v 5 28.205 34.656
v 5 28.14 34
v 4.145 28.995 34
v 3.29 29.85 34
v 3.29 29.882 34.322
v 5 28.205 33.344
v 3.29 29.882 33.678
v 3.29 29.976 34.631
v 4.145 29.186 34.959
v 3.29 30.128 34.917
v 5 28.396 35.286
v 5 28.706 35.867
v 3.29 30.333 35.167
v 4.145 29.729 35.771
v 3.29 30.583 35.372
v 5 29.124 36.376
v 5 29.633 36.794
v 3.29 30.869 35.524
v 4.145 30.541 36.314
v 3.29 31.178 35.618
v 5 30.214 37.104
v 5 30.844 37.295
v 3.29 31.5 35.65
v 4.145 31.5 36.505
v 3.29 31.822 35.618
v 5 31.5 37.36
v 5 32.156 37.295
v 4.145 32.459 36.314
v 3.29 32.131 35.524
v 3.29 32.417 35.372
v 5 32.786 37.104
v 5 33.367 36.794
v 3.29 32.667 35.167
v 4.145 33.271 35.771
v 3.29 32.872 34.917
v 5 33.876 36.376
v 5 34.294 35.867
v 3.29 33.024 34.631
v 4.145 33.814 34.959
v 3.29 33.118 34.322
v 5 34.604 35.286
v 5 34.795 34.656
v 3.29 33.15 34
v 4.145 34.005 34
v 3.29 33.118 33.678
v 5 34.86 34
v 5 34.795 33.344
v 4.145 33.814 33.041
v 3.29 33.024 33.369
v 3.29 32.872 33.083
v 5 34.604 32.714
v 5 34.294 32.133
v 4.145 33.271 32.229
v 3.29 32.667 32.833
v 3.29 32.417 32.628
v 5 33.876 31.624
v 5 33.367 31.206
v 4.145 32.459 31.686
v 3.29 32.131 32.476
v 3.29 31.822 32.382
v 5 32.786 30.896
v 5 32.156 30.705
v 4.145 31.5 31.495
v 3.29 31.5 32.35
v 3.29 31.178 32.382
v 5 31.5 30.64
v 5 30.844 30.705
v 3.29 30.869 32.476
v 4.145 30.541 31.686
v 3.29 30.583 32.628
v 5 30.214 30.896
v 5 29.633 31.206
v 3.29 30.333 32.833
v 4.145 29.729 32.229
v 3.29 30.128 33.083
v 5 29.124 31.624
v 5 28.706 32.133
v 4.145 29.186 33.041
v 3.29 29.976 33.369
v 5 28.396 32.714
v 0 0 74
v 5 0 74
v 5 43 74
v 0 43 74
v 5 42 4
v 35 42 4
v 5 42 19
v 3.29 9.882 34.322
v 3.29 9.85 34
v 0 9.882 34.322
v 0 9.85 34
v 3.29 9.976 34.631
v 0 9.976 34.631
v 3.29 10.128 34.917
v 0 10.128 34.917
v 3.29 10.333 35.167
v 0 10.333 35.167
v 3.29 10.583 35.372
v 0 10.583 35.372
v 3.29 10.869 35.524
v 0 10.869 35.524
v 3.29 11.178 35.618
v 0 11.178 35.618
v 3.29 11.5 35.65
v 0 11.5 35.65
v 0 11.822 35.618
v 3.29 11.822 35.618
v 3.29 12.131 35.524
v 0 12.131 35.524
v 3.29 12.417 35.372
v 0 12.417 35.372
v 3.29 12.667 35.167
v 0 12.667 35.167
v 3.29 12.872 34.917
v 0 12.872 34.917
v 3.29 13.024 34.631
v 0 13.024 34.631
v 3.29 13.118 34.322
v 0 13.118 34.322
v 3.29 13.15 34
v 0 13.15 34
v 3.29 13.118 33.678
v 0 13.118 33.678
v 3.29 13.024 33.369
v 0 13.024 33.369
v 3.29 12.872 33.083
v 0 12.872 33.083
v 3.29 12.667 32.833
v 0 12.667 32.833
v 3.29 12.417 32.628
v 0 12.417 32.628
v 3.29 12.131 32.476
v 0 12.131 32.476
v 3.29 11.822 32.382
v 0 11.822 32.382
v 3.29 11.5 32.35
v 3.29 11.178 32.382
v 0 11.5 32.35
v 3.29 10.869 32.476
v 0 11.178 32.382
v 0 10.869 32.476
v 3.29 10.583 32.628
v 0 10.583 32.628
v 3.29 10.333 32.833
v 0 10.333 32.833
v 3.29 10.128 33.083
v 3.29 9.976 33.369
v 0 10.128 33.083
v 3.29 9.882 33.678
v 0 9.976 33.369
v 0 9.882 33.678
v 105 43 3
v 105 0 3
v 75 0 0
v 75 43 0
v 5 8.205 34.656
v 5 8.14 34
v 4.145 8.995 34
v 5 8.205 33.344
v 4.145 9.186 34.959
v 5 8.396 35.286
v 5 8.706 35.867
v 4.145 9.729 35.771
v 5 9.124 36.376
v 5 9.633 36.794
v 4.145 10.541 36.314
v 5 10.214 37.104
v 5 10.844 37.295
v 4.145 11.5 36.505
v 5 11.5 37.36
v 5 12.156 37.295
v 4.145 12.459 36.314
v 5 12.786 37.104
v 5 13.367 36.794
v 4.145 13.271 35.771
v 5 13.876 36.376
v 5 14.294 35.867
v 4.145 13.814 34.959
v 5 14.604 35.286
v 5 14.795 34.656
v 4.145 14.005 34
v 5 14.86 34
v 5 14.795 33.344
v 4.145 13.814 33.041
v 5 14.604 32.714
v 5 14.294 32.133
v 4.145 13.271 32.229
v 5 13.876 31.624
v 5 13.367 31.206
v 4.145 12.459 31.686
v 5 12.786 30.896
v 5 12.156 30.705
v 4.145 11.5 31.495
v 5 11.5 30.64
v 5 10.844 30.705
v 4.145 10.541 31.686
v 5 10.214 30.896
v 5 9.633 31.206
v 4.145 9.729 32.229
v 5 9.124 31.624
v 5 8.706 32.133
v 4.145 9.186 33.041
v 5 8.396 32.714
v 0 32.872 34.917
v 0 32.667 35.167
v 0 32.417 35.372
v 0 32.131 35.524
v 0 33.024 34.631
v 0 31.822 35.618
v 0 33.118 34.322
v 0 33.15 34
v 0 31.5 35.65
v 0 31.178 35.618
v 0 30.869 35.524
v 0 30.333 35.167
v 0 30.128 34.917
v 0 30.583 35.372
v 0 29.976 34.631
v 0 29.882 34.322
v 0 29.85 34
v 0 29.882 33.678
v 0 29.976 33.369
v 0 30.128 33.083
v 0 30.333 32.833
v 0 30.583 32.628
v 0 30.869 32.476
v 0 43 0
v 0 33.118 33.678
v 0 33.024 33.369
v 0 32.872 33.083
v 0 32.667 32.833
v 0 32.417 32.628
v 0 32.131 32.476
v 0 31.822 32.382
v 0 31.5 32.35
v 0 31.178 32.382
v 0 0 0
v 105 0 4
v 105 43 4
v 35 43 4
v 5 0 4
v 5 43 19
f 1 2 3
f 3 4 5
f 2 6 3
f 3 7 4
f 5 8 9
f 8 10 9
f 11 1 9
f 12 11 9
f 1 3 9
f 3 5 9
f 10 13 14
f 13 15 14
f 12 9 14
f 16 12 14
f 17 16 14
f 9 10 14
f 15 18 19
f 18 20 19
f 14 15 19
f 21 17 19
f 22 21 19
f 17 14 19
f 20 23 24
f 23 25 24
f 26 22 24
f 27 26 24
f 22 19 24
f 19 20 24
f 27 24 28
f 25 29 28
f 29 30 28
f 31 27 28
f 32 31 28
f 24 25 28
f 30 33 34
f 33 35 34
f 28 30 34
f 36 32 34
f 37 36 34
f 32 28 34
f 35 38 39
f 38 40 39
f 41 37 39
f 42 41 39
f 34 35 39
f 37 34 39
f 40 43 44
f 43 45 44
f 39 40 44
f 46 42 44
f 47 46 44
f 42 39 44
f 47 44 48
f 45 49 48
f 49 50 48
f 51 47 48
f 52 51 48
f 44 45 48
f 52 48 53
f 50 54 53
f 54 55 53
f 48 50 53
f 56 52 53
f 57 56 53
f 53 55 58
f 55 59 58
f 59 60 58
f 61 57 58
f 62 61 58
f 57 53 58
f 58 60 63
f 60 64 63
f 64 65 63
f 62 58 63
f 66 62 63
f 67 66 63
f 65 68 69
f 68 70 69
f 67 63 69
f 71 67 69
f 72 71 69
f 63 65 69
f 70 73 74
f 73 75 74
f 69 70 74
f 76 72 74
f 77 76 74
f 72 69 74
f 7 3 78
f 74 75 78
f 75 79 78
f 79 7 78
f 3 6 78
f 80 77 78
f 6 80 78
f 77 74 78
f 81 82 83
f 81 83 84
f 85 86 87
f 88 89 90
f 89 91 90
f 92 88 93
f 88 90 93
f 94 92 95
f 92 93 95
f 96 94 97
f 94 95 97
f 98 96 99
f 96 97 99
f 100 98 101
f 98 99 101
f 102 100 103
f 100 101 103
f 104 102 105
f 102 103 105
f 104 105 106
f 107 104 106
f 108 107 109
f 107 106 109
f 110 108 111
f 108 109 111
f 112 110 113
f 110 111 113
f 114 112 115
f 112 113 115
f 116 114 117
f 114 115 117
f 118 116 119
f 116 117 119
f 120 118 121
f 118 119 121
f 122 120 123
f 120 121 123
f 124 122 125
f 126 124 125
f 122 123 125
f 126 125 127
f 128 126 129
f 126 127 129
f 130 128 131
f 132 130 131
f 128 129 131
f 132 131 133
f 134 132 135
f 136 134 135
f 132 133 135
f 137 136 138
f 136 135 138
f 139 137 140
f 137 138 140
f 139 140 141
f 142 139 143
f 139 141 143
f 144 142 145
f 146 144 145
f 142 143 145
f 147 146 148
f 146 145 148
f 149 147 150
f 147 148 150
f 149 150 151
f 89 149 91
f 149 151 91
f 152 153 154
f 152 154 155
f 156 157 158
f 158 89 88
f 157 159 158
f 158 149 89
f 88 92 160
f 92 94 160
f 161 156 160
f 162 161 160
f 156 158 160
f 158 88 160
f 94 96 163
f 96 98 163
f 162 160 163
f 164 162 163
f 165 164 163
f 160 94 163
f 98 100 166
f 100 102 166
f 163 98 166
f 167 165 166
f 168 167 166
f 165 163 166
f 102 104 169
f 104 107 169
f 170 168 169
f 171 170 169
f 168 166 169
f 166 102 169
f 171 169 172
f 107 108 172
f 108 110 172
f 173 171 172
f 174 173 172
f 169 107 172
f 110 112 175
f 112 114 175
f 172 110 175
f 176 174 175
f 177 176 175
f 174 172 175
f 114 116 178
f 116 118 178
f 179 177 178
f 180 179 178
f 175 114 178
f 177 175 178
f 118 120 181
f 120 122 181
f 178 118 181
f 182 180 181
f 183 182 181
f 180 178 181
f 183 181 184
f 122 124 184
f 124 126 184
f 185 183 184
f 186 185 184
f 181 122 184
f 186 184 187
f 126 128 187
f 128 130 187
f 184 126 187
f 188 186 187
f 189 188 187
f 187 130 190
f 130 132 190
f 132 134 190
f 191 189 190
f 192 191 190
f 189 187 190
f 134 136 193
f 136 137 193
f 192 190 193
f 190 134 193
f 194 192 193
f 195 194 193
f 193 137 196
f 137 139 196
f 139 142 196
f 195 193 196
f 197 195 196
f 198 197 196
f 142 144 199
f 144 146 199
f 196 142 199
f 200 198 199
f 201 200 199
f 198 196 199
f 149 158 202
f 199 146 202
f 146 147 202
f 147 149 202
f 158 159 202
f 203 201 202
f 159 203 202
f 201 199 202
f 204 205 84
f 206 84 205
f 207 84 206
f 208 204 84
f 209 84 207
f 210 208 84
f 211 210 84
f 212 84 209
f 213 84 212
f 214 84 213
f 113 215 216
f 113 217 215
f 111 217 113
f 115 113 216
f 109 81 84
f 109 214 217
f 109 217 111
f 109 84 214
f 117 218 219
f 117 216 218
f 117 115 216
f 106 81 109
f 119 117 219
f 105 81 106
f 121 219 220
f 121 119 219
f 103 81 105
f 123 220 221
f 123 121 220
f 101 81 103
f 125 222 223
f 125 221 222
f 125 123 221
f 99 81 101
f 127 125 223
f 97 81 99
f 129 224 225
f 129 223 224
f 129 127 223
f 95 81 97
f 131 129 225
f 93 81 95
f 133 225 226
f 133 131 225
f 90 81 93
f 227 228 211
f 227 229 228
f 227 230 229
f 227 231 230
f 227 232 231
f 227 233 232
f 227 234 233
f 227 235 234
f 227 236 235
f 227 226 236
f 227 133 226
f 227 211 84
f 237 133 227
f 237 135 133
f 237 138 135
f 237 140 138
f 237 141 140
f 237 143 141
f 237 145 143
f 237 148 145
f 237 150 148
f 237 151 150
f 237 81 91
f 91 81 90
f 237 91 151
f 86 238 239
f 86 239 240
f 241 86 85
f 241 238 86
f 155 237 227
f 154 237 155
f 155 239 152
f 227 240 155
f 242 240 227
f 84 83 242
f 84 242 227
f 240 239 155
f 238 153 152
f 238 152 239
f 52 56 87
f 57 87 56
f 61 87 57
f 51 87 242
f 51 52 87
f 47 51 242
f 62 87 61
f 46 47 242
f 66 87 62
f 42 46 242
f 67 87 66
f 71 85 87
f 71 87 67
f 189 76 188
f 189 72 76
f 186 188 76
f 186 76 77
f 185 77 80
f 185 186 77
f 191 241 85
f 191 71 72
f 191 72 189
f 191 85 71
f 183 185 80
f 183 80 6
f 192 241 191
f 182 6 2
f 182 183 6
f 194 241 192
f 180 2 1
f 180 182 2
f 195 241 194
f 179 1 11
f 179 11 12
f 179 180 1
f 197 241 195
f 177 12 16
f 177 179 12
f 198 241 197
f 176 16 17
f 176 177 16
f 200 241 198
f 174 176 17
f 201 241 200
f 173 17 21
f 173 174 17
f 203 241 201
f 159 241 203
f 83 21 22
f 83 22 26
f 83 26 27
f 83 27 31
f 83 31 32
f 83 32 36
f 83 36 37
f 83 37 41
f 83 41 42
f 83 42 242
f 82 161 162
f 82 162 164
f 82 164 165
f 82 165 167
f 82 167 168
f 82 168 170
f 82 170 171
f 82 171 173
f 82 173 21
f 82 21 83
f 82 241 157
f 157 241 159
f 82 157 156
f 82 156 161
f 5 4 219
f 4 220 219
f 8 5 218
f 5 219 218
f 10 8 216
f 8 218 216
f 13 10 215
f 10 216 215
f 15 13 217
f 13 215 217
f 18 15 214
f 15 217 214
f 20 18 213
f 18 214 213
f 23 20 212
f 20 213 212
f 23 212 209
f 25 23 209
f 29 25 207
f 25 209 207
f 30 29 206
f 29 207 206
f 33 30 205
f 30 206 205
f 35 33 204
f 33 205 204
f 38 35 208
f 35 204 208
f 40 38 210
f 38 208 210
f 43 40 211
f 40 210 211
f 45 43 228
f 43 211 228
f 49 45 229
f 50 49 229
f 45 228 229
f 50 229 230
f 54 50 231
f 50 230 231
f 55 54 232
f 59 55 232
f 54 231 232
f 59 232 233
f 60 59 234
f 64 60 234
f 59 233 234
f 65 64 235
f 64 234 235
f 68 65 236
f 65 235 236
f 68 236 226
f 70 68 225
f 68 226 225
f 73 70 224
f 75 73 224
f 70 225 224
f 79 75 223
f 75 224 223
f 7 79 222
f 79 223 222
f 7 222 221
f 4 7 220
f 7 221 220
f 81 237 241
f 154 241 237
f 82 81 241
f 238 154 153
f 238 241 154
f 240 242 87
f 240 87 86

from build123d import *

# Parameters (mm, degrees)
F1_DEPTH       = 43
F3_D           = 3.3
F3_CSINK_D     = 6.72
F3_CSINK_ANGLE = 90
F4_SIZE2       = 3
F4_SIZE        = 30
F6_DEPTH       = 1


with BuildPart() as f1:
    # F0 (on Front) → F1 (new body)
    with BuildSketch(Plane.XZ):
        Polygon((0, 74), (0, 0), (105, 0), (105, 4), (5, 4), (5, 74), align=None)
    extrude(amount=-F1_DEPTH)

    # F3 (through all)
    with Locations(Plane.YZ.offset(5)):
        with Locations((31.5, 34), (11.5, 34)):
            CounterSinkHole(F3_D / 2, F3_CSINK_D / 2, counter_sink_angle=F3_CSINK_ANGLE)

    # F4
    f4_edges = [f1.edges().sort_by_distance(p)[0] for p in [
        (105, 21.5, 0),
    ]]
    f4_side = f1.faces().sort_by_distance((52.5, 21.5, 0))[0]
    chamfer(f4_edges, length=F4_SIZE, length2=F4_SIZE2, reference=f4_side)

    # F5 (on face) → F6 (join)
    with BuildSketch(Plane(origin=(0, 43, 0), x_dir=(-1, 0, 0), z_dir=(0, 1, 0))):
        Polygon((-35, 4), (-5, 4), (-5, 19), align=None)
    extrude(amount=-F6_DEPTH)


solid = f1.part
